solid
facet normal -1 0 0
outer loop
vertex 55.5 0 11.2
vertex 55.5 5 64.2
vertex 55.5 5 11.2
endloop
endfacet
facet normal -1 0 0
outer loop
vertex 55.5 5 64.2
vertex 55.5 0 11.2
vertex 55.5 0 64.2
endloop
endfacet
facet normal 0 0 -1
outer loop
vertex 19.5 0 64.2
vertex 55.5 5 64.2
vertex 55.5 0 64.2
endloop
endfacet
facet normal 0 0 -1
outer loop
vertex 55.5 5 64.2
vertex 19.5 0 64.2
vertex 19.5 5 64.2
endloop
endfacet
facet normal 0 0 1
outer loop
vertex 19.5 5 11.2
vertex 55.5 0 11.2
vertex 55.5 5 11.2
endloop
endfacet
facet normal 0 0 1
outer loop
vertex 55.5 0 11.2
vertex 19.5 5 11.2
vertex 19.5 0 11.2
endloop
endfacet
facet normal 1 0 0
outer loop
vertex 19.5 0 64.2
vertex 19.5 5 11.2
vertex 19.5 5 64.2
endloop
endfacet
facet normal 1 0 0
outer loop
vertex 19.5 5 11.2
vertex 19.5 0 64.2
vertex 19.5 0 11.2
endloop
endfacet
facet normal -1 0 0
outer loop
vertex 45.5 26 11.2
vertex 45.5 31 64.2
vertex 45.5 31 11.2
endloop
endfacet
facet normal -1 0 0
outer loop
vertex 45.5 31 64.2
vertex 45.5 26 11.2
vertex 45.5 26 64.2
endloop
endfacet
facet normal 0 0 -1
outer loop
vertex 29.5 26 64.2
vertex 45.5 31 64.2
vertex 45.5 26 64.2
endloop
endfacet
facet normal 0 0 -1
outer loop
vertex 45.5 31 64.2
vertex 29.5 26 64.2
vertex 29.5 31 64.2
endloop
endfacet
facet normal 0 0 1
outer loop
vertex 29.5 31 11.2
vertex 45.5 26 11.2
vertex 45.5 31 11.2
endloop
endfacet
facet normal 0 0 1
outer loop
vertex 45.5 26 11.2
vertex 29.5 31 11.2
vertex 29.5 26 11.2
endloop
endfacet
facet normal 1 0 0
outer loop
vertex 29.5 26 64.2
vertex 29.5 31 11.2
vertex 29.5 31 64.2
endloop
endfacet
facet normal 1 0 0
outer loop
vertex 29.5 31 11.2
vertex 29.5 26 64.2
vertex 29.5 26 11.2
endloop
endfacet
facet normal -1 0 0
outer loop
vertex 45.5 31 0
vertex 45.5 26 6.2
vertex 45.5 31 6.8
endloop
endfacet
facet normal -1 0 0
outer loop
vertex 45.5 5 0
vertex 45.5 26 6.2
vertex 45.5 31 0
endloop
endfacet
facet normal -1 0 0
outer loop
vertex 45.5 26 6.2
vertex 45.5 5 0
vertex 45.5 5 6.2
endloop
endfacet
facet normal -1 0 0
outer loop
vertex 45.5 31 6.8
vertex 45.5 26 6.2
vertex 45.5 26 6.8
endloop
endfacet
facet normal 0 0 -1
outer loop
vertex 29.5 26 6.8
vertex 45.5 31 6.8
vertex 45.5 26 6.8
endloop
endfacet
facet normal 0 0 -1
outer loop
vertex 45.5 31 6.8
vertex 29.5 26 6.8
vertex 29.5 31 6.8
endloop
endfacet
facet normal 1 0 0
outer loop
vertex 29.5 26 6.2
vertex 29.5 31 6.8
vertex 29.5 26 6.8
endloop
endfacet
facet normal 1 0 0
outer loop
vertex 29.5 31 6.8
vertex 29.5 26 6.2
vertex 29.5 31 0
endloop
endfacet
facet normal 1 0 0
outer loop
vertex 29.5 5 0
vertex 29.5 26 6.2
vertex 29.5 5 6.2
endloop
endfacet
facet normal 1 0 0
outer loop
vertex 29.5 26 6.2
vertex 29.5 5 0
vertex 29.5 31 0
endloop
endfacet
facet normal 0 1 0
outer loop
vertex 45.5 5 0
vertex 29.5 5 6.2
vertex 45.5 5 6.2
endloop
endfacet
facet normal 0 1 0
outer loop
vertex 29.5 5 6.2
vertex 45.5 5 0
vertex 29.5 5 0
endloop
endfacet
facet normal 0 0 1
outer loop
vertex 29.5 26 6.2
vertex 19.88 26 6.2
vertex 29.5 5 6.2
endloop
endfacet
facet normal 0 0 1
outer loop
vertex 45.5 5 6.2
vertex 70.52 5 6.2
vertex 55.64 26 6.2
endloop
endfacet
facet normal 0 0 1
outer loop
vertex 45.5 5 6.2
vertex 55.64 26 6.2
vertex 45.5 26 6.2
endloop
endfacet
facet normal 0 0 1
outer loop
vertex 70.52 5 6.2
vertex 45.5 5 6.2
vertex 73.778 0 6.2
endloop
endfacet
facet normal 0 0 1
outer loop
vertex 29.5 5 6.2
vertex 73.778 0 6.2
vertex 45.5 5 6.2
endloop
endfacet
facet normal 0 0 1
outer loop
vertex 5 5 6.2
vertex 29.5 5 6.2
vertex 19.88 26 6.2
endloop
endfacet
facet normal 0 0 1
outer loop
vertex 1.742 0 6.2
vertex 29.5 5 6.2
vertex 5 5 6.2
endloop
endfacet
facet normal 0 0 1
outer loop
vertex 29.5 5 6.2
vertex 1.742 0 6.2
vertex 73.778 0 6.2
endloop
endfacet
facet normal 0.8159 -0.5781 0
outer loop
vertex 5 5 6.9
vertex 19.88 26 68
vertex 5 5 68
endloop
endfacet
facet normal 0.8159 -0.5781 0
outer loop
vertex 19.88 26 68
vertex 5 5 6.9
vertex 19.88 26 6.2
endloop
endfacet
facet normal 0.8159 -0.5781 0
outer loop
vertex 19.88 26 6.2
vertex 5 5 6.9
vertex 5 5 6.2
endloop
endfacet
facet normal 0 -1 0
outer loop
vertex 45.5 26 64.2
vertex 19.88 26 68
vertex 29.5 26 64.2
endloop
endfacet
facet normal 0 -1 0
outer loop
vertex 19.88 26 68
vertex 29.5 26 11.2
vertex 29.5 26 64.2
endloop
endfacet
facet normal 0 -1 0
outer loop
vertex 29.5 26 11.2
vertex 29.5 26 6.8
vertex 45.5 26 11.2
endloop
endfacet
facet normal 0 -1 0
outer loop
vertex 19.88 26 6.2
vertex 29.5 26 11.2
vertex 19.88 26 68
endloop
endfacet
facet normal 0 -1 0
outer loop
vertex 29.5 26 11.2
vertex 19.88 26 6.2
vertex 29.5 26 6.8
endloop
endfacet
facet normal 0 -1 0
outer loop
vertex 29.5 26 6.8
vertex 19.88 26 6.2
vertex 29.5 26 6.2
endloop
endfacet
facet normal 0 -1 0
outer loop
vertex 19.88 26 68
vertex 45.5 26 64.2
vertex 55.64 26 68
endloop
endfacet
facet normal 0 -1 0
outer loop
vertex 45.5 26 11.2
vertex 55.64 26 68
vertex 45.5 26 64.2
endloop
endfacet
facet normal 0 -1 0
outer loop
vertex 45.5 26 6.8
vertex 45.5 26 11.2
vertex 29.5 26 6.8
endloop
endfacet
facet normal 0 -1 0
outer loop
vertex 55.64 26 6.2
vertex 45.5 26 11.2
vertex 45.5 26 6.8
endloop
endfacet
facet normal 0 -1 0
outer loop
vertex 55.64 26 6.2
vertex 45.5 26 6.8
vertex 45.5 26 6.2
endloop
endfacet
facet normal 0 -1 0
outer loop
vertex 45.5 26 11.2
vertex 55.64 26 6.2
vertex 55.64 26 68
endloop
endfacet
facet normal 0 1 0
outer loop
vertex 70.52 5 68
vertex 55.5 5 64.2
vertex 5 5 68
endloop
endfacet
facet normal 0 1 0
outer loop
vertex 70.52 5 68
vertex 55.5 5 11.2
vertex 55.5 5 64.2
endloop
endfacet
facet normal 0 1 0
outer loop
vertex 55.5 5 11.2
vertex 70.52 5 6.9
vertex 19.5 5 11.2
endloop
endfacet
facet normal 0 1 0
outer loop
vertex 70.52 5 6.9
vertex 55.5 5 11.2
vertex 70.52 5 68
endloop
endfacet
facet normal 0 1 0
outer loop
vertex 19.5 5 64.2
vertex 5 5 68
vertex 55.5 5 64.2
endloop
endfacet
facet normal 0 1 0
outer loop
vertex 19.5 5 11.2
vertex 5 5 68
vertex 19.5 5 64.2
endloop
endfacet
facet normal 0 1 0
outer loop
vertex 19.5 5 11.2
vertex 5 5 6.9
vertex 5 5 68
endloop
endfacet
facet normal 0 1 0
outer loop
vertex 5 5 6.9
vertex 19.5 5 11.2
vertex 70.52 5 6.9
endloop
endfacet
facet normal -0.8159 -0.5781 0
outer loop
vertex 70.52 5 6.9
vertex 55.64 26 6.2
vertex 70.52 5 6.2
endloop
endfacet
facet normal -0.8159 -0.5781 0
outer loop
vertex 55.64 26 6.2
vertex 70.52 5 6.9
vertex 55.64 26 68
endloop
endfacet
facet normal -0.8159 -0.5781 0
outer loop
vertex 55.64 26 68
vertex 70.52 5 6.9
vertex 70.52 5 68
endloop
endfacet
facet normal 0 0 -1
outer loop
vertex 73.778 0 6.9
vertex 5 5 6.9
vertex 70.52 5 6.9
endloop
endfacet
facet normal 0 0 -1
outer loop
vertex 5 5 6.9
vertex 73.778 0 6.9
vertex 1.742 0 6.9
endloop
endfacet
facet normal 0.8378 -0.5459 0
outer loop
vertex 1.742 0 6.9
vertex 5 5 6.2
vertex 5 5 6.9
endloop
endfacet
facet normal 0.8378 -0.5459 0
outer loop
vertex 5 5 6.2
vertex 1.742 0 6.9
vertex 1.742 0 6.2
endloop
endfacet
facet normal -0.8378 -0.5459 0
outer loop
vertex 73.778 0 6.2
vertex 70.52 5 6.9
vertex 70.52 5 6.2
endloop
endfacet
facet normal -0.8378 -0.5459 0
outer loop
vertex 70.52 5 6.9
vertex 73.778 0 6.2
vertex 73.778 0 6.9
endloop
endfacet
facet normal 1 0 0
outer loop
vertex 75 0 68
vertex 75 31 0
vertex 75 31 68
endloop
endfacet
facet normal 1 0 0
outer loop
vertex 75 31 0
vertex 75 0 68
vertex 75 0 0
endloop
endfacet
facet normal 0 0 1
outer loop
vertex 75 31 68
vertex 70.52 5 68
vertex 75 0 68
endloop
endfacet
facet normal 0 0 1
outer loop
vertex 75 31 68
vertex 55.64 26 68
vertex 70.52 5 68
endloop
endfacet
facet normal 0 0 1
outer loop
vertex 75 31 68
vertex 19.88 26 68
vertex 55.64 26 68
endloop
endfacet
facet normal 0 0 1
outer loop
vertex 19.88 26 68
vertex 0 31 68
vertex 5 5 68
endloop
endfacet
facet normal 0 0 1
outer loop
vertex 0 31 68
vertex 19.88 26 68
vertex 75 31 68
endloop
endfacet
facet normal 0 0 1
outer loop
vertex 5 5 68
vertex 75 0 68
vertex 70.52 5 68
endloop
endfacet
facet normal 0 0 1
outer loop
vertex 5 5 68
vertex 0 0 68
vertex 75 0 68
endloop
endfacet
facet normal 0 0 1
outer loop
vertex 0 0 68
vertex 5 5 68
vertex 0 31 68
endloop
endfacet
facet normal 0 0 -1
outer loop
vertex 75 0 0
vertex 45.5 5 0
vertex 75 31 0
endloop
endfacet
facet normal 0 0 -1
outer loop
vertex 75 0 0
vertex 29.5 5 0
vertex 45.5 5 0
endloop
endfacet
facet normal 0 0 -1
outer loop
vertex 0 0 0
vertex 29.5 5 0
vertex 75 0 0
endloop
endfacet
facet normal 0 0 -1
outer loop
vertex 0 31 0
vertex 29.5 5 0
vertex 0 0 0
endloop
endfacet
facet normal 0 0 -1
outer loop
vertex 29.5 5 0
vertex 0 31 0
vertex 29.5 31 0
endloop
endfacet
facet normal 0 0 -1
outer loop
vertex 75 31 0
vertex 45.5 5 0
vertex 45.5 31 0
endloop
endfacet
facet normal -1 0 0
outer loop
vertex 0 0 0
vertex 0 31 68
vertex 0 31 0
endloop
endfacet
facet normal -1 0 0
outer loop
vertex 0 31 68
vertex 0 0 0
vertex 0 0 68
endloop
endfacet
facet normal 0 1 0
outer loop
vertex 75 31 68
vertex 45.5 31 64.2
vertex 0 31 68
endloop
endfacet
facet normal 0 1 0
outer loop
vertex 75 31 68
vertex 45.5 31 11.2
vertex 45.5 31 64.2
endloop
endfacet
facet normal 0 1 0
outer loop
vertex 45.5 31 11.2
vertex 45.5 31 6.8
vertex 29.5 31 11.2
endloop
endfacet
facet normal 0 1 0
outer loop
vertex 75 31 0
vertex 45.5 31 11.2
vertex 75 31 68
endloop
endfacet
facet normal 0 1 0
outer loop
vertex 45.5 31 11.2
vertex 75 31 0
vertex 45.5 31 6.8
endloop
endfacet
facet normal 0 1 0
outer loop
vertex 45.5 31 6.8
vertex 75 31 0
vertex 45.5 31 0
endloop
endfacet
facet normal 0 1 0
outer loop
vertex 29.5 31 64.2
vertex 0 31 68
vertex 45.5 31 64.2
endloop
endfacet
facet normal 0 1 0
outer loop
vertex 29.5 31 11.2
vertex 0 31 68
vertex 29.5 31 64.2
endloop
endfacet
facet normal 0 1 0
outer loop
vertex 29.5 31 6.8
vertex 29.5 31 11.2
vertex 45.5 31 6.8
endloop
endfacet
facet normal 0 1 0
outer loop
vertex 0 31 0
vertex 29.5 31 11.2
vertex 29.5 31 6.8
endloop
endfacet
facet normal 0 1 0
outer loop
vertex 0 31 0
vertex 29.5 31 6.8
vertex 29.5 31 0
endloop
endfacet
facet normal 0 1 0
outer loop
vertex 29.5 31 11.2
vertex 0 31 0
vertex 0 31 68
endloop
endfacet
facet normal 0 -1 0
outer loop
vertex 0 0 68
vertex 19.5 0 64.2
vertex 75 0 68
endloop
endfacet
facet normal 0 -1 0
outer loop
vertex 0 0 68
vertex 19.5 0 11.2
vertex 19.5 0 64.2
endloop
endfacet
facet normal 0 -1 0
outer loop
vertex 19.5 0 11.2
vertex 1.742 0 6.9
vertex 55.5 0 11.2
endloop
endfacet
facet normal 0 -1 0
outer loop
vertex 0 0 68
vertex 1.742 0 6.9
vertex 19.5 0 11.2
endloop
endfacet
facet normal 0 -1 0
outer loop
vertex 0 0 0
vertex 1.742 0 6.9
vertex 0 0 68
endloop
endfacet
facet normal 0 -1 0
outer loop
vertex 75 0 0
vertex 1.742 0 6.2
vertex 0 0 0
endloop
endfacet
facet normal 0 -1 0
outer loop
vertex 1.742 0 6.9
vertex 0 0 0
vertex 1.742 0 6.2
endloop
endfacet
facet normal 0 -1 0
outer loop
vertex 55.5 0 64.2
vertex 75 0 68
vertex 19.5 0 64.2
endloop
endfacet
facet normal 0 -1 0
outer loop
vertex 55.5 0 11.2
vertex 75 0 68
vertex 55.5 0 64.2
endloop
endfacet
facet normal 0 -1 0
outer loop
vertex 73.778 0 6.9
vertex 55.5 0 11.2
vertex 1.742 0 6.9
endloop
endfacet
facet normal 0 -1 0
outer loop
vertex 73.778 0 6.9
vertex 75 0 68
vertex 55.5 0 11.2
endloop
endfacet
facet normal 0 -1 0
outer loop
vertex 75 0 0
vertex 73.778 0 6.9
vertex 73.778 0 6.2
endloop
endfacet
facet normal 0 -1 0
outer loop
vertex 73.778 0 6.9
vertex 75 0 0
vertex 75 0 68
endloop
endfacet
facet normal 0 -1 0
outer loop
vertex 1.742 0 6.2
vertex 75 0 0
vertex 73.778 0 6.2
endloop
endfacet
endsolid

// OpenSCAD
NumberOfBlades=100;
b=1+NumberOfBlades*0.62;
difference(){
cube([75,31,b+5]);
translate([5,5,6.2])
union(){
polyhedron(
    points=[
        [0,0,0],            //0
        [65.52,0,0],        //1
        [50.64,21,0],       //2
        [14.88,21,0],       //3
        [14.88,21,b],       //4
        [50.64,21,b],       //5
        [65.52,0,b],        //6
        [0,0,b]             //7
    ],
    faces=[
        [0,1,2,3],          //Bottom
        [3,2,5,4],          //Back
        [0,3,4,7],          //Left
        [2,1,6,5],          //Right
        [4,5,6,7],          //Top
        [7,6,1,0]           //Front
    ]
);
if(NumberOfBlades>50){
    translate([14.5,-6,5])
        cube([36,8,b-10]);
    translate([24.5,19,5])
        cube([16,8,b-10]);}
if(NumberOfBlades>5){
polyhedron(
    points=[
        [0,0,0],         //0
        [65.52,0,0],     //1
        [69.43,-6,0],    //2
        [-3.91,-6,0],    //3
        [-3.91,-6,.7],   //4
        [69.43,-6,.7],   //5
        [65.52,0,.7],    //6
        [0,0,.7]         //7
        ],
    faces=[
        [3,2,1,0],          //Bottom
        [2,3,4,5],          //Back
        [7,4,3,0],          //Left
        [5,6,1,2],          //Right
        [7,6,5,4],          //Top
        [6,7,0,1]           //Front
        ]);
}
translate([24.5,0,-6.4]){
    if(NumberOfBlades>5){
        cube([16,27,7]);}{
        cube([16,21,7]);}}
}
}
